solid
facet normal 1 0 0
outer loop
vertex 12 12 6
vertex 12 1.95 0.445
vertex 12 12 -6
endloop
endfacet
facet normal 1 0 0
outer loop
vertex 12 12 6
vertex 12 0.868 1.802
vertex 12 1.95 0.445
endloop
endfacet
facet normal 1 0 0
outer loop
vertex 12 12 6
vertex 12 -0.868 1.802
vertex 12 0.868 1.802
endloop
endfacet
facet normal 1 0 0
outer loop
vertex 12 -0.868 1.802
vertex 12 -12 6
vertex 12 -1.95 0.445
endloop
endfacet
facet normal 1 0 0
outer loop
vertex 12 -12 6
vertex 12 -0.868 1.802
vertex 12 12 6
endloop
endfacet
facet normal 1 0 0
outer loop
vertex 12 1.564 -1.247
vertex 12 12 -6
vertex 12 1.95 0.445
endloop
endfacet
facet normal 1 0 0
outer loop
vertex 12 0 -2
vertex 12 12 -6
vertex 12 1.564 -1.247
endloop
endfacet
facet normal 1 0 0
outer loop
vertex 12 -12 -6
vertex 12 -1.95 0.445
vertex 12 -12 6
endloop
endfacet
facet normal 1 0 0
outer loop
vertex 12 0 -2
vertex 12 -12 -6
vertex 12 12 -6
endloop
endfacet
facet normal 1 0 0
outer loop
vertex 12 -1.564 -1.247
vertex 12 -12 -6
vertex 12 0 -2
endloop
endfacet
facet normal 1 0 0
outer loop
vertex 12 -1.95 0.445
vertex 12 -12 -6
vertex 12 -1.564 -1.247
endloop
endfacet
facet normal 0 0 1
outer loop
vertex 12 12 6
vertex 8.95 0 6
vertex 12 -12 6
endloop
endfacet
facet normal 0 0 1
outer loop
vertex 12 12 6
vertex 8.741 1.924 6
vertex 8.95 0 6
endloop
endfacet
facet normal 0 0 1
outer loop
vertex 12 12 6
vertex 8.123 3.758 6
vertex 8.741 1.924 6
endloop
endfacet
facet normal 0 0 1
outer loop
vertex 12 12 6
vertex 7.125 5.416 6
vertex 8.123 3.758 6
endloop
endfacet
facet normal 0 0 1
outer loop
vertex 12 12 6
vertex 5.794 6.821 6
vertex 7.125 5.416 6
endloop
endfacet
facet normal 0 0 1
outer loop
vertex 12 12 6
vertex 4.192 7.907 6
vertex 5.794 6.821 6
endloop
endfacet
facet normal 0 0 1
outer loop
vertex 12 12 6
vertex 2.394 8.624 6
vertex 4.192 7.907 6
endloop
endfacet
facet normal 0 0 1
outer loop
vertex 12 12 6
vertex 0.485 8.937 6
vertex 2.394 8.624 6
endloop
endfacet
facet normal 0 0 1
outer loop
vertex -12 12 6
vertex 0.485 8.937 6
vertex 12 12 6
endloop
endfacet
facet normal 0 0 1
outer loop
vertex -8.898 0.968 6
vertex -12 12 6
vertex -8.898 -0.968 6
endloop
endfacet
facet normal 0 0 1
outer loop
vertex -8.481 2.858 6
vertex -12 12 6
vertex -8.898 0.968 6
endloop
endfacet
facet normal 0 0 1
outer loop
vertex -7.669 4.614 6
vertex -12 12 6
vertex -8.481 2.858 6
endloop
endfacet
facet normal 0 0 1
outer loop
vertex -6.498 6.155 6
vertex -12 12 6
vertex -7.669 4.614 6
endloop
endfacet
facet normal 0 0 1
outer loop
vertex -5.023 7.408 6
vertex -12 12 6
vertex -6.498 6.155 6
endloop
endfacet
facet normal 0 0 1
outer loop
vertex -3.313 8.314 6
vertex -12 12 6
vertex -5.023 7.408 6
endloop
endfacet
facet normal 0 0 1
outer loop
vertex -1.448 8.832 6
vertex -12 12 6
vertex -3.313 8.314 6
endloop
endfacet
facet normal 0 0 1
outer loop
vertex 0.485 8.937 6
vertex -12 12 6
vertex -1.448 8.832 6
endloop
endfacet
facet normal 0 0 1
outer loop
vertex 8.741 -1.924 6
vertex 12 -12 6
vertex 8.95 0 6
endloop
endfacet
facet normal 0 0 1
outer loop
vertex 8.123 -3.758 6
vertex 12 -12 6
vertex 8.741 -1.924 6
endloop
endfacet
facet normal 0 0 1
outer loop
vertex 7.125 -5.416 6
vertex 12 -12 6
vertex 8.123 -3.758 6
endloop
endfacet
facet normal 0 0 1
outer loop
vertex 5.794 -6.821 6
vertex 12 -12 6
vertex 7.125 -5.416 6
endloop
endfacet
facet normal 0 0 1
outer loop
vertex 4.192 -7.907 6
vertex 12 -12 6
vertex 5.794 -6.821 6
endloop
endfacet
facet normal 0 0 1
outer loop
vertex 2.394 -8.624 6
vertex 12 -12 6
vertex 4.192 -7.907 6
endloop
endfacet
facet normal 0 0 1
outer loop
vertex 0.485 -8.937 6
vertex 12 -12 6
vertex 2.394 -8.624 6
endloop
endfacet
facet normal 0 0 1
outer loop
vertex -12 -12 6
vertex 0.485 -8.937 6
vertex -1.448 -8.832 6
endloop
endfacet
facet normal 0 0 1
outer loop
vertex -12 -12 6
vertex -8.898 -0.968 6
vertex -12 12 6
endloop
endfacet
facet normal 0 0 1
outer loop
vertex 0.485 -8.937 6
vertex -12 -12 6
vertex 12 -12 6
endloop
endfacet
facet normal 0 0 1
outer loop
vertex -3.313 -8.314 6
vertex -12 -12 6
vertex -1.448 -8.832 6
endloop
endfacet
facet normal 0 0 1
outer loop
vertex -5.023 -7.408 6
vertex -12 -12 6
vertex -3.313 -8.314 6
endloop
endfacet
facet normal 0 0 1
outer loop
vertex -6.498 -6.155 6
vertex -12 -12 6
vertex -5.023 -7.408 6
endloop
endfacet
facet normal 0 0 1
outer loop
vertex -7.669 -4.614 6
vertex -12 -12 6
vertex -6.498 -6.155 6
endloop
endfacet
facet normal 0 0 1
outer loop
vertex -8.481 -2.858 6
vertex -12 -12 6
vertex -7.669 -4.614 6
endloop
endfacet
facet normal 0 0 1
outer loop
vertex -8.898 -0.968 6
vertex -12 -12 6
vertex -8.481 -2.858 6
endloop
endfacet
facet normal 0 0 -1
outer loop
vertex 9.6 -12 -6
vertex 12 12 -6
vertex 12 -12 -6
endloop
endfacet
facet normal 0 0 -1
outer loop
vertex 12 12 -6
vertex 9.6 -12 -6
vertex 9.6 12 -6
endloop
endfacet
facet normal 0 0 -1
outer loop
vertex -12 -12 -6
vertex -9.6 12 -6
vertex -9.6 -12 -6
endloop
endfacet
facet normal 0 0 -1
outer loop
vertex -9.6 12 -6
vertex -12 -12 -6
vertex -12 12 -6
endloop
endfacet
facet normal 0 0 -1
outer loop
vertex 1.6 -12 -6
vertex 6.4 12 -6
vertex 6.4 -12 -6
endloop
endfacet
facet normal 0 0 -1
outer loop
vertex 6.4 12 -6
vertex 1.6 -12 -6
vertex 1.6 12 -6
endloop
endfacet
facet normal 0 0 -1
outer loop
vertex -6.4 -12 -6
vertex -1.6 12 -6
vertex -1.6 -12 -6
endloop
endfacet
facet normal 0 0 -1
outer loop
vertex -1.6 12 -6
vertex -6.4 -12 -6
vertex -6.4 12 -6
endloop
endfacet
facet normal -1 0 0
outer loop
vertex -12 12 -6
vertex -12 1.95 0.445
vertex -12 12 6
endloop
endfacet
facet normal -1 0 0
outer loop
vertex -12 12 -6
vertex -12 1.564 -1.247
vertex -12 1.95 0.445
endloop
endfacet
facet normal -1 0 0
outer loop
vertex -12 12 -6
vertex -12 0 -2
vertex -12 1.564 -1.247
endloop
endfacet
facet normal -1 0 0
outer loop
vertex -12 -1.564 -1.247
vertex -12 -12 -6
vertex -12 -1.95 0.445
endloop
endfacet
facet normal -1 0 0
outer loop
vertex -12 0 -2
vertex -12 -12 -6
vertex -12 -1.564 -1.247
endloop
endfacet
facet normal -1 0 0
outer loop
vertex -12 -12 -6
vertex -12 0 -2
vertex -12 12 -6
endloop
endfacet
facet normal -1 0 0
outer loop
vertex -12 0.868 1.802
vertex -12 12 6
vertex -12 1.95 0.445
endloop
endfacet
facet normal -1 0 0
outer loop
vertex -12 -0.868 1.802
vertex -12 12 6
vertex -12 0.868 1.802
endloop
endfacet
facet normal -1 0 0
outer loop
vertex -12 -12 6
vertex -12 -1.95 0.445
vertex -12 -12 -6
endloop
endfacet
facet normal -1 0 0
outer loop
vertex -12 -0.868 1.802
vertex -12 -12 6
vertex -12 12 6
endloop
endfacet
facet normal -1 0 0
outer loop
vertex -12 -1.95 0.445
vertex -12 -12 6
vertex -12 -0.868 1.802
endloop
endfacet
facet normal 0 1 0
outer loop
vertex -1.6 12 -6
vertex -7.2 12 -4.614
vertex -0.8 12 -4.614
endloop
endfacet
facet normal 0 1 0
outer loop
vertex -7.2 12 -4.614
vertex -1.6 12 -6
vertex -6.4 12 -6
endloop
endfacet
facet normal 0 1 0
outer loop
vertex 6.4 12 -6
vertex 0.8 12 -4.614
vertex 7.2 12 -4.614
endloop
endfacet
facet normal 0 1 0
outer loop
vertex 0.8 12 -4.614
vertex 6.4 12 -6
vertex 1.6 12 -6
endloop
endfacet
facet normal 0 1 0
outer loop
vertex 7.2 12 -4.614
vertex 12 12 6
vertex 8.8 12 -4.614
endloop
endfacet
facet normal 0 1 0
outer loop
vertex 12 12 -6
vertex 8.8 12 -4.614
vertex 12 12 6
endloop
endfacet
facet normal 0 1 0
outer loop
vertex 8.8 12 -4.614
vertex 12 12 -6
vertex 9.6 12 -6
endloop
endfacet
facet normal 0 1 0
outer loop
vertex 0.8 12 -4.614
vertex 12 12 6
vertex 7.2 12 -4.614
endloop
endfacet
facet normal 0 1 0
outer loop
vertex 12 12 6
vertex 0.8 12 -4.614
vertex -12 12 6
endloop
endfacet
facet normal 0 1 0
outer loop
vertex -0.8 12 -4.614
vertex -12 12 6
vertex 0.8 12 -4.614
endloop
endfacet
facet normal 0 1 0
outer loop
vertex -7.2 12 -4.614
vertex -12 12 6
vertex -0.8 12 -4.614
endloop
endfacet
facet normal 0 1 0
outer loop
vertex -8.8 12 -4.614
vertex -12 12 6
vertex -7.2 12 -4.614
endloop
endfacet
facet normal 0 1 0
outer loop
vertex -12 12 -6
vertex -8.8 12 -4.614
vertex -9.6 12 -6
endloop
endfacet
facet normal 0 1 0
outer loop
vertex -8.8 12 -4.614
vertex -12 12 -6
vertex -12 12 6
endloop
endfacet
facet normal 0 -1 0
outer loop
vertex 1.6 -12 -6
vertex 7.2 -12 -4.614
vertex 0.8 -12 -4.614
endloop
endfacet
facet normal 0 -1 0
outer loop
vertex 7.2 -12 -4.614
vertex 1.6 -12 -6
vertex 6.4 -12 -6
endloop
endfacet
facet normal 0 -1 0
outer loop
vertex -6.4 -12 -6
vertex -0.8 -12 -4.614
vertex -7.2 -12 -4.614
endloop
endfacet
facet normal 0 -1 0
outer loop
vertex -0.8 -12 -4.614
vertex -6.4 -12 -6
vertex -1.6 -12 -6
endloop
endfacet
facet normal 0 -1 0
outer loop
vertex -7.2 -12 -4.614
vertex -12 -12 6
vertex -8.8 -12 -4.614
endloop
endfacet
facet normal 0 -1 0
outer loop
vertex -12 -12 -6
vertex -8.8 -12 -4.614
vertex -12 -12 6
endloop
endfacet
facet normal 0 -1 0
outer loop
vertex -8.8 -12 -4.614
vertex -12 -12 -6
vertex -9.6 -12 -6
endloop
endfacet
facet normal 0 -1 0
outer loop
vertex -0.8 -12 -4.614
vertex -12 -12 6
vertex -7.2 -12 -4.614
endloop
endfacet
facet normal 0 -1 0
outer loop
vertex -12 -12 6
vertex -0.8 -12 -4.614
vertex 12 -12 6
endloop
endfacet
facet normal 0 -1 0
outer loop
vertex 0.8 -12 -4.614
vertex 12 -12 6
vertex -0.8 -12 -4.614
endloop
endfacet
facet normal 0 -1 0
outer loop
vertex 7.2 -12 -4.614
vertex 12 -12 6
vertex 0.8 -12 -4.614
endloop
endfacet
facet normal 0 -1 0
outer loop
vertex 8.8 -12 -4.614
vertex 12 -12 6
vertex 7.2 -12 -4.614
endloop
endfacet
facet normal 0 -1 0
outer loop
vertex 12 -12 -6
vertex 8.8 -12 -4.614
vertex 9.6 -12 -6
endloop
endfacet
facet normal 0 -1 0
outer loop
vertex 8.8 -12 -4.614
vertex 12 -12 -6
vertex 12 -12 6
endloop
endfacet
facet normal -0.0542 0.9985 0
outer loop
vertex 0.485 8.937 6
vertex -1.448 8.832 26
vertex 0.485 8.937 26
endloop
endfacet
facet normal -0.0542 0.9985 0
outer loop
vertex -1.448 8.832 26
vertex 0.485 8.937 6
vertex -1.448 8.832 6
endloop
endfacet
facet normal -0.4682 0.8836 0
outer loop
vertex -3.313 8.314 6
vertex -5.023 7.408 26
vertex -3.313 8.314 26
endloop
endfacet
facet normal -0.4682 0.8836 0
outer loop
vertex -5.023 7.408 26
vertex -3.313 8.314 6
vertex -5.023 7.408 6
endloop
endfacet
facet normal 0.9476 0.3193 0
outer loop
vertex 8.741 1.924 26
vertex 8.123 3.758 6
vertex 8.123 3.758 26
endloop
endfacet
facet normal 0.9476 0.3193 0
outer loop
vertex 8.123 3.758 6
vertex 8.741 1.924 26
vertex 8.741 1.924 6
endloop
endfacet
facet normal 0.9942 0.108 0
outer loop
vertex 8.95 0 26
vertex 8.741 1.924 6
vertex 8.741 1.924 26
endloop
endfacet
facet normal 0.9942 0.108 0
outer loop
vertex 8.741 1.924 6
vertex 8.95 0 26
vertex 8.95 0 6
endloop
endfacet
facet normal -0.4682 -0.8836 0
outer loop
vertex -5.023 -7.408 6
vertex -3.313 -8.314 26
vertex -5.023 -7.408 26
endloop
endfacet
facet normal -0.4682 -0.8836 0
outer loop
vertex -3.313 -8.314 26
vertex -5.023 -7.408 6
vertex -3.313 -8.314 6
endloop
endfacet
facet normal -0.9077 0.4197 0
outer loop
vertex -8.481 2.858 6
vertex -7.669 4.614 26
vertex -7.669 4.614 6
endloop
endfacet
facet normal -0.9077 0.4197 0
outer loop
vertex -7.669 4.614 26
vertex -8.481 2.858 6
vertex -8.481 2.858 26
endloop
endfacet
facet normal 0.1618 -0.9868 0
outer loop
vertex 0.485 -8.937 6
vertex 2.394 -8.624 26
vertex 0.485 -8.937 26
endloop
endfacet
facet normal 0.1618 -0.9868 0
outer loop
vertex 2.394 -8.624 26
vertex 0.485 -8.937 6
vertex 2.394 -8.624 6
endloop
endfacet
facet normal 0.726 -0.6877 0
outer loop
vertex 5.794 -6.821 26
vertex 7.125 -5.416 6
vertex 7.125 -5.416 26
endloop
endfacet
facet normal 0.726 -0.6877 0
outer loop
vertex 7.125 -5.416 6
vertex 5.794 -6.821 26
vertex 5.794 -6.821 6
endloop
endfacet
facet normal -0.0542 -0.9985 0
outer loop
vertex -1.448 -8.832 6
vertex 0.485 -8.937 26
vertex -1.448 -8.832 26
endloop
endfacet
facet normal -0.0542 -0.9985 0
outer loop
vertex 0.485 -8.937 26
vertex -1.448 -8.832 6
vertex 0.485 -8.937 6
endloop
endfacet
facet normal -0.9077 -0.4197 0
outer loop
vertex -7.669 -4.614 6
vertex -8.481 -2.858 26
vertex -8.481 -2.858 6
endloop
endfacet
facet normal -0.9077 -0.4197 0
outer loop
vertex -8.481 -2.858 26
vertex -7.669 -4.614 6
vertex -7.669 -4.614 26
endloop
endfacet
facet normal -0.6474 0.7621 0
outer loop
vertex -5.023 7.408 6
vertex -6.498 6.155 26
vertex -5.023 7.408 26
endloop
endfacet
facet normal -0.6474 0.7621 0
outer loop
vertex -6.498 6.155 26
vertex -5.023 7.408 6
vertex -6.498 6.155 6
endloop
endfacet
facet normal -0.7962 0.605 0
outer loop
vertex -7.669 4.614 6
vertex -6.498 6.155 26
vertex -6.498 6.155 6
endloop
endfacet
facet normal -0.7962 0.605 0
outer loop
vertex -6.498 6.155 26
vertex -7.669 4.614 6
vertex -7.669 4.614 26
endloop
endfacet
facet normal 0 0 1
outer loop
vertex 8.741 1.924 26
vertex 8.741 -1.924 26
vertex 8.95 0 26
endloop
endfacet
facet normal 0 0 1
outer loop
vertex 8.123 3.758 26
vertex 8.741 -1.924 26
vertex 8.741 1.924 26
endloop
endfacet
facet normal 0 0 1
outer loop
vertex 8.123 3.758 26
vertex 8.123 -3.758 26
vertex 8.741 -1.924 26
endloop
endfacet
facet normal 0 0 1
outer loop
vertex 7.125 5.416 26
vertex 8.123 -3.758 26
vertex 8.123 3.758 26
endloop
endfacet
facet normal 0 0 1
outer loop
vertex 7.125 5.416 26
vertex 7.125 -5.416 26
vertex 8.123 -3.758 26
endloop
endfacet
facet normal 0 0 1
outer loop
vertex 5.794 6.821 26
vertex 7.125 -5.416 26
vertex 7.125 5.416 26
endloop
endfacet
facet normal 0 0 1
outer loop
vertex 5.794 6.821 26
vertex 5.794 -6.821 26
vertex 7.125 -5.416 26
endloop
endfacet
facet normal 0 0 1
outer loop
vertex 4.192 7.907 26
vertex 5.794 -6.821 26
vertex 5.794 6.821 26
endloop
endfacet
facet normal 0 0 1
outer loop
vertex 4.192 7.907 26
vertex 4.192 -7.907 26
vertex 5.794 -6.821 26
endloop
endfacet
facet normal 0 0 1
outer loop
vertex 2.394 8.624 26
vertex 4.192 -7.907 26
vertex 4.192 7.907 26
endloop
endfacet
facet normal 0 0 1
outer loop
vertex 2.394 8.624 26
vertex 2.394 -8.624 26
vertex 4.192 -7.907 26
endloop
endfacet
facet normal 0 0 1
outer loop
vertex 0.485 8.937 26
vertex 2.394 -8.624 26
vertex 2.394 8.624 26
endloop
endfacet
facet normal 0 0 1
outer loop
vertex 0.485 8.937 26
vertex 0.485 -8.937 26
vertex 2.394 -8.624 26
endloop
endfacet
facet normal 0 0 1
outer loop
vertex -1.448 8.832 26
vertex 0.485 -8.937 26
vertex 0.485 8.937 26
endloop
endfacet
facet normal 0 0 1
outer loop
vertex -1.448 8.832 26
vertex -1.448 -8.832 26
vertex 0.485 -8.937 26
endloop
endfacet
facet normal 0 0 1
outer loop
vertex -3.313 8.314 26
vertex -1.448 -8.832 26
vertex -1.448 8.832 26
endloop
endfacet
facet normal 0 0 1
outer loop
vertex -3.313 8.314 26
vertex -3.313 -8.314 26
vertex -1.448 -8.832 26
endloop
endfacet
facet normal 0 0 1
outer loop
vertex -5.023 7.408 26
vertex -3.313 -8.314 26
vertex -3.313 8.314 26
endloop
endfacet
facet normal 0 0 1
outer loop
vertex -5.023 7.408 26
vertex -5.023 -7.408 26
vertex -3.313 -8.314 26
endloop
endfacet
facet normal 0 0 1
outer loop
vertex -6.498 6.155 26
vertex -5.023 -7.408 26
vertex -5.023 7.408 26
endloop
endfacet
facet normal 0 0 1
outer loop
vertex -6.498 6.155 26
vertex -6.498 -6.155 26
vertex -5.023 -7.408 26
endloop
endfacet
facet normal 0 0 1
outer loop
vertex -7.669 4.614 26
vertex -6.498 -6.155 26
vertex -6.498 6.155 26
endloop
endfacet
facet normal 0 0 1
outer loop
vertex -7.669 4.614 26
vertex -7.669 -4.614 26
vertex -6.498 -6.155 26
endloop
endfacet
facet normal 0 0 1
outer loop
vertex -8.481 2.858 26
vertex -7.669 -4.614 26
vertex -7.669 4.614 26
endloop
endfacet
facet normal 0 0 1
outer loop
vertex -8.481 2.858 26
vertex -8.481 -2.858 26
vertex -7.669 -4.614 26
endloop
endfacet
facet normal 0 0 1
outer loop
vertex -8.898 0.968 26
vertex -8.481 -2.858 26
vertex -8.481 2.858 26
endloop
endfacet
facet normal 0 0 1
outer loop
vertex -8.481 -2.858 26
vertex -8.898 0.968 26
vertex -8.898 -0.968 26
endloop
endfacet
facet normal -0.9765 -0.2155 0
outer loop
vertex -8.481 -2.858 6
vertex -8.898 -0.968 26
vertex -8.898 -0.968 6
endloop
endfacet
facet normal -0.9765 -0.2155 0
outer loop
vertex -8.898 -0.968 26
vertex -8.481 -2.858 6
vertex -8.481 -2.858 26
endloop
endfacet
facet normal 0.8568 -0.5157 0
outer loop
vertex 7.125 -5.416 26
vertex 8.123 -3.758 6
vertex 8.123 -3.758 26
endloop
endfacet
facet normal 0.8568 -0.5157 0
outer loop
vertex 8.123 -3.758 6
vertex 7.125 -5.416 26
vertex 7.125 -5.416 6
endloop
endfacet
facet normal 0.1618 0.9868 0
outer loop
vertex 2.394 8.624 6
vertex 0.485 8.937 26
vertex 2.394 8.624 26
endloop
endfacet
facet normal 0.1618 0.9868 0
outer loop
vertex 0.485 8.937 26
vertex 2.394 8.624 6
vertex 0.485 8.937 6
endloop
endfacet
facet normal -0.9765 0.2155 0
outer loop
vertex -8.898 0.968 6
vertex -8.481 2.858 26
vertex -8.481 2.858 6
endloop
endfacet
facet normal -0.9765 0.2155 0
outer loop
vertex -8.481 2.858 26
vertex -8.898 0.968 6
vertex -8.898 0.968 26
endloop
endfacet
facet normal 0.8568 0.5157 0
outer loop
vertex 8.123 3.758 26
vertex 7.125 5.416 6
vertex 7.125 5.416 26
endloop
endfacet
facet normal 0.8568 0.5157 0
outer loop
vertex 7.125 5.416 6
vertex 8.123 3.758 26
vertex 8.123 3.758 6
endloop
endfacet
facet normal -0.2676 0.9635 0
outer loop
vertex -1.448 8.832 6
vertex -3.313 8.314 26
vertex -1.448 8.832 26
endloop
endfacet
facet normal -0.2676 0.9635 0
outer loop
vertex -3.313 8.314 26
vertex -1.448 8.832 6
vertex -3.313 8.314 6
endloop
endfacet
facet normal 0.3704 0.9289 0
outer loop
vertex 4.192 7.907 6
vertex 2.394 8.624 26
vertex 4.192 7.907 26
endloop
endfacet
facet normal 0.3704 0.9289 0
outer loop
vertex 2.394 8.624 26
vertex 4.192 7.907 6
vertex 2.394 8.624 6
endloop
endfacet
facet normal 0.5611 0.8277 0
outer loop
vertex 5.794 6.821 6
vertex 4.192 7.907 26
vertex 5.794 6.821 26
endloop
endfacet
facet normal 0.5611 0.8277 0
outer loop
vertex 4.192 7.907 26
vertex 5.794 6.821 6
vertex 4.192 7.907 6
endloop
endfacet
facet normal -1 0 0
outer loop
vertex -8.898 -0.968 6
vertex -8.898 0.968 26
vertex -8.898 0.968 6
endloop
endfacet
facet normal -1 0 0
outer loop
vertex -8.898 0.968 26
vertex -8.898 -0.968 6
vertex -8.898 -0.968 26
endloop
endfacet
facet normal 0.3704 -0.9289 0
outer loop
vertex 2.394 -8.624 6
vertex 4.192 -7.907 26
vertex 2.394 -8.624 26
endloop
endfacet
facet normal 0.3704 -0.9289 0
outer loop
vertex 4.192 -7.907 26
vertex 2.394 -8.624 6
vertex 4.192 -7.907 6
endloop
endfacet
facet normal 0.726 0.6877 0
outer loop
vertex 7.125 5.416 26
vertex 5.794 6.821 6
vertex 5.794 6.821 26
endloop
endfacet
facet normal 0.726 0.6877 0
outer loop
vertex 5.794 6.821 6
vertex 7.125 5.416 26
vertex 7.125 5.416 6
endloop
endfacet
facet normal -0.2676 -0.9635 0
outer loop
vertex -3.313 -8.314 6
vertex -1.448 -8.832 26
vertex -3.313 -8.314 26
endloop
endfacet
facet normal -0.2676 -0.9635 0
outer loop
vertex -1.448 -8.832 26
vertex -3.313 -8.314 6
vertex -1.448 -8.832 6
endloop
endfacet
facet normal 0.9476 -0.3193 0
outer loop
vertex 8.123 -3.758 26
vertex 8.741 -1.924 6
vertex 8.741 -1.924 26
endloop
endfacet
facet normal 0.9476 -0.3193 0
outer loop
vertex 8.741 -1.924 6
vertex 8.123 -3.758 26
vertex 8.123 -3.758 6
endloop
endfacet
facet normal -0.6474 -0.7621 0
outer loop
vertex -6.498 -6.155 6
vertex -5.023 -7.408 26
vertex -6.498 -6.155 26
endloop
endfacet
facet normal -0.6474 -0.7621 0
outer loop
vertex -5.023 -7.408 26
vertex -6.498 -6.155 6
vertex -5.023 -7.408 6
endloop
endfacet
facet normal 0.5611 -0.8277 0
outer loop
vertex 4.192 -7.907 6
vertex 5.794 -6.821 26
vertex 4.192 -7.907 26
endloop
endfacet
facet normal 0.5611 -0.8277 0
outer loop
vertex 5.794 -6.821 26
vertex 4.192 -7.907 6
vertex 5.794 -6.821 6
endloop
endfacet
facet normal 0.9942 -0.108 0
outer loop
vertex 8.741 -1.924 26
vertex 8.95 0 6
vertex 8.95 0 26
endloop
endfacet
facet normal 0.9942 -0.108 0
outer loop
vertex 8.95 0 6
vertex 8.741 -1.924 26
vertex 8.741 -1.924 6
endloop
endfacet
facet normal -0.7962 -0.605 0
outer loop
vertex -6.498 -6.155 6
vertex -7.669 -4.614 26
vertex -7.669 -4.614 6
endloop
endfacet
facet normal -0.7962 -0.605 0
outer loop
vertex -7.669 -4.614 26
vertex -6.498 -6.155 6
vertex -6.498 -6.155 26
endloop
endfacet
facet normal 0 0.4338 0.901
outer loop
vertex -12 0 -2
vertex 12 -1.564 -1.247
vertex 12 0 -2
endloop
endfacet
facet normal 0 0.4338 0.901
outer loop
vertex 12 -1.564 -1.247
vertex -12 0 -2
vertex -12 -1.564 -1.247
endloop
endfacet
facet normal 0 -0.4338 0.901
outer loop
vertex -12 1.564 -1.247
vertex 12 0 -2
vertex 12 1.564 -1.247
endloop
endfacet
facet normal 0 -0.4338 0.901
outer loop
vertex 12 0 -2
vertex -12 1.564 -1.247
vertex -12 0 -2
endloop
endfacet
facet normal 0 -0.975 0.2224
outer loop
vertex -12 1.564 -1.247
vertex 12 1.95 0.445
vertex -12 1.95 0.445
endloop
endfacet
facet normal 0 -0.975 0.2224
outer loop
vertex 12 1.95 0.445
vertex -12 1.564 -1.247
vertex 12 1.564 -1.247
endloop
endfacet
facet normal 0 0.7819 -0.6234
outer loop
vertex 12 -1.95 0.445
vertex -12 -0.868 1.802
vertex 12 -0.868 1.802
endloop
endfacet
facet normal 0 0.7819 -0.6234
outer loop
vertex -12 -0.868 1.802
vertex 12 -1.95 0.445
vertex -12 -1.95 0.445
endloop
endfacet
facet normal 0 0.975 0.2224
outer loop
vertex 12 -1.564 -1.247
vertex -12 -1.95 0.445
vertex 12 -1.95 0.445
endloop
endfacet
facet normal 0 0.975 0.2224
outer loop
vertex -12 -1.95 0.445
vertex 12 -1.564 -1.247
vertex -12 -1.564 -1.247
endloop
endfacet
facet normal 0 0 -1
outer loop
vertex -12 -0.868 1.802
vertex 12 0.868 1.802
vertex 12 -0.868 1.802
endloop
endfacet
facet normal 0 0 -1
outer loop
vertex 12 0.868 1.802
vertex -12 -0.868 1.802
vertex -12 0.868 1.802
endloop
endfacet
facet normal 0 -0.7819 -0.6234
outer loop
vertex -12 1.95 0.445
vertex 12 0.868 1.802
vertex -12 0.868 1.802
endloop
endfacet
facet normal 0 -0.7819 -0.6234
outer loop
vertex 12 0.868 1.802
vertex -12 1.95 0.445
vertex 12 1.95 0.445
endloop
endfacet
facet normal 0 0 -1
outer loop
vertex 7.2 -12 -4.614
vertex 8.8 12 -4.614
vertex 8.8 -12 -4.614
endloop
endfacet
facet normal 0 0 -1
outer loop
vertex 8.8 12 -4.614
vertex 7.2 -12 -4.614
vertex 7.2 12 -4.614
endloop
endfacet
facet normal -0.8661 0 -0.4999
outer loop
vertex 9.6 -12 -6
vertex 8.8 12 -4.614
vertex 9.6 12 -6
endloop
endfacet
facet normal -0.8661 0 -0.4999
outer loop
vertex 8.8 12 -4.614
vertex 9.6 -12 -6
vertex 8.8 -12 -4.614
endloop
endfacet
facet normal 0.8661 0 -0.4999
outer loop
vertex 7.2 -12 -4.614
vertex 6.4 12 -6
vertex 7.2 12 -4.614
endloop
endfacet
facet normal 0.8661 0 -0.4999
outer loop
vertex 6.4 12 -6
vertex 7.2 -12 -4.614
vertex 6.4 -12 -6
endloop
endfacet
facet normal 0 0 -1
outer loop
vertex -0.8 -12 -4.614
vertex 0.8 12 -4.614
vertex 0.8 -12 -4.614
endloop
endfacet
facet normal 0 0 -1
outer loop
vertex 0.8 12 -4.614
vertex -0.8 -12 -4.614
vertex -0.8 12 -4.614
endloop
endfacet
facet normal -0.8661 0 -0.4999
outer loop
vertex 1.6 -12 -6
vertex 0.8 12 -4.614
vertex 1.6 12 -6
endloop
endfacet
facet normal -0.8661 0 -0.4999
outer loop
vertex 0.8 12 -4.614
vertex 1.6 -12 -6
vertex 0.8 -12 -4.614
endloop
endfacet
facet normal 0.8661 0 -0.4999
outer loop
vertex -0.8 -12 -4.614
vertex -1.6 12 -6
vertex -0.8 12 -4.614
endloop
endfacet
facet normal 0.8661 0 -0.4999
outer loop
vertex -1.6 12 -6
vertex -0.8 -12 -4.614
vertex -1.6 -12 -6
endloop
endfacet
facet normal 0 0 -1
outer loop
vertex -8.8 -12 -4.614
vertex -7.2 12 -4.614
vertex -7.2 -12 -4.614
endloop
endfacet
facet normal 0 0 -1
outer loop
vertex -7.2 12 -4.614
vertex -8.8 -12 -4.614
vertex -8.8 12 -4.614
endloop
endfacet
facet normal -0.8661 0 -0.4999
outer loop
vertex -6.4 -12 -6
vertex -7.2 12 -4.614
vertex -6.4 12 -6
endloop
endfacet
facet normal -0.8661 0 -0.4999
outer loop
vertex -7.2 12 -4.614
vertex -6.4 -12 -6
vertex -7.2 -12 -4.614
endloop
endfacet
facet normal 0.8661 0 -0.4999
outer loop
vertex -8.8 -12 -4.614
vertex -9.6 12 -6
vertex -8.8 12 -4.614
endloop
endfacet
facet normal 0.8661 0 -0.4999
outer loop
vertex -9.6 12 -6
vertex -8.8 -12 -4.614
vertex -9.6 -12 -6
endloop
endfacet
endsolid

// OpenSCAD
// file: constants.scad
/*
 * Written by Dermot Tynan, Kalopa Research.
 * GPLv2.
 *
 * This file has all the constants for the OpenWing sail.
 *
 * All dimensions are in mm.
 */
wall_thickness = 3;

cf_mast_outer_dia = 20.85;
cf_mast_inner_dia = 17.90;
cf_mast_insert_len = 20;

mast_cap_dia = 24;
mast_cap_height = 16;
mast_base_x = 24;
mast_base_y = 24;
mast_base_height = 12;
mast_base_grip_off = 8;
mast_base_grip_dia = 3.2;

gooseneck_height = 24;
gooseneck_len = 20;
gooseneck_barrel_dia = 11;
gooseplate_width = 26;

kicker_ring_dia = 18;

attach_pin_dia = 6;
washer_thickness = 0.8;
rigging_line_dia = 4;
// main file
/*
 * Written by Dermot Tynan, Kalopa Research.
 * GPLv2.
 *
 * This is the definition for the five mast supports on the upper
 * leading-edge of the mast, A8 -> A12.
 *
 * All dimensions are in mm.
 */
include <constants.scad>

module mastbase()
{
	difference() {
		union() {
			cube([mast_base_x, mast_base_y, mast_base_height], center = true);
			translate([0, 0, 16])
				cylinder(r = cf_mast_inner_dia/2, h = cf_mast_insert_len, center = true);
		}
		rotate([0, 90, 0])
			cylinder(r = rigging_line_dia/2, h = 40, center = true);
		translate([mast_base_grip_off, 0, -mast_base_height/2]) rotate([90, 0, 0])
			cylinder(r = mast_base_grip_dia/2, h = mast_base_y + 10, center = true, $fn = 6);
		translate([0, 0, -mast_base_height/2]) rotate([90, 0, 0])
			cylinder(r = mast_base_grip_dia/2, h = mast_base_y + 10, center = true, $fn = 6);
		translate([-mast_base_grip_off, 0, -mast_base_height/2]) rotate([90, 0, 0])
			cylinder(r = mast_base_grip_dia/2, h = mast_base_y + 10, center = true, $fn = 6);
	}
}

mastbase();
